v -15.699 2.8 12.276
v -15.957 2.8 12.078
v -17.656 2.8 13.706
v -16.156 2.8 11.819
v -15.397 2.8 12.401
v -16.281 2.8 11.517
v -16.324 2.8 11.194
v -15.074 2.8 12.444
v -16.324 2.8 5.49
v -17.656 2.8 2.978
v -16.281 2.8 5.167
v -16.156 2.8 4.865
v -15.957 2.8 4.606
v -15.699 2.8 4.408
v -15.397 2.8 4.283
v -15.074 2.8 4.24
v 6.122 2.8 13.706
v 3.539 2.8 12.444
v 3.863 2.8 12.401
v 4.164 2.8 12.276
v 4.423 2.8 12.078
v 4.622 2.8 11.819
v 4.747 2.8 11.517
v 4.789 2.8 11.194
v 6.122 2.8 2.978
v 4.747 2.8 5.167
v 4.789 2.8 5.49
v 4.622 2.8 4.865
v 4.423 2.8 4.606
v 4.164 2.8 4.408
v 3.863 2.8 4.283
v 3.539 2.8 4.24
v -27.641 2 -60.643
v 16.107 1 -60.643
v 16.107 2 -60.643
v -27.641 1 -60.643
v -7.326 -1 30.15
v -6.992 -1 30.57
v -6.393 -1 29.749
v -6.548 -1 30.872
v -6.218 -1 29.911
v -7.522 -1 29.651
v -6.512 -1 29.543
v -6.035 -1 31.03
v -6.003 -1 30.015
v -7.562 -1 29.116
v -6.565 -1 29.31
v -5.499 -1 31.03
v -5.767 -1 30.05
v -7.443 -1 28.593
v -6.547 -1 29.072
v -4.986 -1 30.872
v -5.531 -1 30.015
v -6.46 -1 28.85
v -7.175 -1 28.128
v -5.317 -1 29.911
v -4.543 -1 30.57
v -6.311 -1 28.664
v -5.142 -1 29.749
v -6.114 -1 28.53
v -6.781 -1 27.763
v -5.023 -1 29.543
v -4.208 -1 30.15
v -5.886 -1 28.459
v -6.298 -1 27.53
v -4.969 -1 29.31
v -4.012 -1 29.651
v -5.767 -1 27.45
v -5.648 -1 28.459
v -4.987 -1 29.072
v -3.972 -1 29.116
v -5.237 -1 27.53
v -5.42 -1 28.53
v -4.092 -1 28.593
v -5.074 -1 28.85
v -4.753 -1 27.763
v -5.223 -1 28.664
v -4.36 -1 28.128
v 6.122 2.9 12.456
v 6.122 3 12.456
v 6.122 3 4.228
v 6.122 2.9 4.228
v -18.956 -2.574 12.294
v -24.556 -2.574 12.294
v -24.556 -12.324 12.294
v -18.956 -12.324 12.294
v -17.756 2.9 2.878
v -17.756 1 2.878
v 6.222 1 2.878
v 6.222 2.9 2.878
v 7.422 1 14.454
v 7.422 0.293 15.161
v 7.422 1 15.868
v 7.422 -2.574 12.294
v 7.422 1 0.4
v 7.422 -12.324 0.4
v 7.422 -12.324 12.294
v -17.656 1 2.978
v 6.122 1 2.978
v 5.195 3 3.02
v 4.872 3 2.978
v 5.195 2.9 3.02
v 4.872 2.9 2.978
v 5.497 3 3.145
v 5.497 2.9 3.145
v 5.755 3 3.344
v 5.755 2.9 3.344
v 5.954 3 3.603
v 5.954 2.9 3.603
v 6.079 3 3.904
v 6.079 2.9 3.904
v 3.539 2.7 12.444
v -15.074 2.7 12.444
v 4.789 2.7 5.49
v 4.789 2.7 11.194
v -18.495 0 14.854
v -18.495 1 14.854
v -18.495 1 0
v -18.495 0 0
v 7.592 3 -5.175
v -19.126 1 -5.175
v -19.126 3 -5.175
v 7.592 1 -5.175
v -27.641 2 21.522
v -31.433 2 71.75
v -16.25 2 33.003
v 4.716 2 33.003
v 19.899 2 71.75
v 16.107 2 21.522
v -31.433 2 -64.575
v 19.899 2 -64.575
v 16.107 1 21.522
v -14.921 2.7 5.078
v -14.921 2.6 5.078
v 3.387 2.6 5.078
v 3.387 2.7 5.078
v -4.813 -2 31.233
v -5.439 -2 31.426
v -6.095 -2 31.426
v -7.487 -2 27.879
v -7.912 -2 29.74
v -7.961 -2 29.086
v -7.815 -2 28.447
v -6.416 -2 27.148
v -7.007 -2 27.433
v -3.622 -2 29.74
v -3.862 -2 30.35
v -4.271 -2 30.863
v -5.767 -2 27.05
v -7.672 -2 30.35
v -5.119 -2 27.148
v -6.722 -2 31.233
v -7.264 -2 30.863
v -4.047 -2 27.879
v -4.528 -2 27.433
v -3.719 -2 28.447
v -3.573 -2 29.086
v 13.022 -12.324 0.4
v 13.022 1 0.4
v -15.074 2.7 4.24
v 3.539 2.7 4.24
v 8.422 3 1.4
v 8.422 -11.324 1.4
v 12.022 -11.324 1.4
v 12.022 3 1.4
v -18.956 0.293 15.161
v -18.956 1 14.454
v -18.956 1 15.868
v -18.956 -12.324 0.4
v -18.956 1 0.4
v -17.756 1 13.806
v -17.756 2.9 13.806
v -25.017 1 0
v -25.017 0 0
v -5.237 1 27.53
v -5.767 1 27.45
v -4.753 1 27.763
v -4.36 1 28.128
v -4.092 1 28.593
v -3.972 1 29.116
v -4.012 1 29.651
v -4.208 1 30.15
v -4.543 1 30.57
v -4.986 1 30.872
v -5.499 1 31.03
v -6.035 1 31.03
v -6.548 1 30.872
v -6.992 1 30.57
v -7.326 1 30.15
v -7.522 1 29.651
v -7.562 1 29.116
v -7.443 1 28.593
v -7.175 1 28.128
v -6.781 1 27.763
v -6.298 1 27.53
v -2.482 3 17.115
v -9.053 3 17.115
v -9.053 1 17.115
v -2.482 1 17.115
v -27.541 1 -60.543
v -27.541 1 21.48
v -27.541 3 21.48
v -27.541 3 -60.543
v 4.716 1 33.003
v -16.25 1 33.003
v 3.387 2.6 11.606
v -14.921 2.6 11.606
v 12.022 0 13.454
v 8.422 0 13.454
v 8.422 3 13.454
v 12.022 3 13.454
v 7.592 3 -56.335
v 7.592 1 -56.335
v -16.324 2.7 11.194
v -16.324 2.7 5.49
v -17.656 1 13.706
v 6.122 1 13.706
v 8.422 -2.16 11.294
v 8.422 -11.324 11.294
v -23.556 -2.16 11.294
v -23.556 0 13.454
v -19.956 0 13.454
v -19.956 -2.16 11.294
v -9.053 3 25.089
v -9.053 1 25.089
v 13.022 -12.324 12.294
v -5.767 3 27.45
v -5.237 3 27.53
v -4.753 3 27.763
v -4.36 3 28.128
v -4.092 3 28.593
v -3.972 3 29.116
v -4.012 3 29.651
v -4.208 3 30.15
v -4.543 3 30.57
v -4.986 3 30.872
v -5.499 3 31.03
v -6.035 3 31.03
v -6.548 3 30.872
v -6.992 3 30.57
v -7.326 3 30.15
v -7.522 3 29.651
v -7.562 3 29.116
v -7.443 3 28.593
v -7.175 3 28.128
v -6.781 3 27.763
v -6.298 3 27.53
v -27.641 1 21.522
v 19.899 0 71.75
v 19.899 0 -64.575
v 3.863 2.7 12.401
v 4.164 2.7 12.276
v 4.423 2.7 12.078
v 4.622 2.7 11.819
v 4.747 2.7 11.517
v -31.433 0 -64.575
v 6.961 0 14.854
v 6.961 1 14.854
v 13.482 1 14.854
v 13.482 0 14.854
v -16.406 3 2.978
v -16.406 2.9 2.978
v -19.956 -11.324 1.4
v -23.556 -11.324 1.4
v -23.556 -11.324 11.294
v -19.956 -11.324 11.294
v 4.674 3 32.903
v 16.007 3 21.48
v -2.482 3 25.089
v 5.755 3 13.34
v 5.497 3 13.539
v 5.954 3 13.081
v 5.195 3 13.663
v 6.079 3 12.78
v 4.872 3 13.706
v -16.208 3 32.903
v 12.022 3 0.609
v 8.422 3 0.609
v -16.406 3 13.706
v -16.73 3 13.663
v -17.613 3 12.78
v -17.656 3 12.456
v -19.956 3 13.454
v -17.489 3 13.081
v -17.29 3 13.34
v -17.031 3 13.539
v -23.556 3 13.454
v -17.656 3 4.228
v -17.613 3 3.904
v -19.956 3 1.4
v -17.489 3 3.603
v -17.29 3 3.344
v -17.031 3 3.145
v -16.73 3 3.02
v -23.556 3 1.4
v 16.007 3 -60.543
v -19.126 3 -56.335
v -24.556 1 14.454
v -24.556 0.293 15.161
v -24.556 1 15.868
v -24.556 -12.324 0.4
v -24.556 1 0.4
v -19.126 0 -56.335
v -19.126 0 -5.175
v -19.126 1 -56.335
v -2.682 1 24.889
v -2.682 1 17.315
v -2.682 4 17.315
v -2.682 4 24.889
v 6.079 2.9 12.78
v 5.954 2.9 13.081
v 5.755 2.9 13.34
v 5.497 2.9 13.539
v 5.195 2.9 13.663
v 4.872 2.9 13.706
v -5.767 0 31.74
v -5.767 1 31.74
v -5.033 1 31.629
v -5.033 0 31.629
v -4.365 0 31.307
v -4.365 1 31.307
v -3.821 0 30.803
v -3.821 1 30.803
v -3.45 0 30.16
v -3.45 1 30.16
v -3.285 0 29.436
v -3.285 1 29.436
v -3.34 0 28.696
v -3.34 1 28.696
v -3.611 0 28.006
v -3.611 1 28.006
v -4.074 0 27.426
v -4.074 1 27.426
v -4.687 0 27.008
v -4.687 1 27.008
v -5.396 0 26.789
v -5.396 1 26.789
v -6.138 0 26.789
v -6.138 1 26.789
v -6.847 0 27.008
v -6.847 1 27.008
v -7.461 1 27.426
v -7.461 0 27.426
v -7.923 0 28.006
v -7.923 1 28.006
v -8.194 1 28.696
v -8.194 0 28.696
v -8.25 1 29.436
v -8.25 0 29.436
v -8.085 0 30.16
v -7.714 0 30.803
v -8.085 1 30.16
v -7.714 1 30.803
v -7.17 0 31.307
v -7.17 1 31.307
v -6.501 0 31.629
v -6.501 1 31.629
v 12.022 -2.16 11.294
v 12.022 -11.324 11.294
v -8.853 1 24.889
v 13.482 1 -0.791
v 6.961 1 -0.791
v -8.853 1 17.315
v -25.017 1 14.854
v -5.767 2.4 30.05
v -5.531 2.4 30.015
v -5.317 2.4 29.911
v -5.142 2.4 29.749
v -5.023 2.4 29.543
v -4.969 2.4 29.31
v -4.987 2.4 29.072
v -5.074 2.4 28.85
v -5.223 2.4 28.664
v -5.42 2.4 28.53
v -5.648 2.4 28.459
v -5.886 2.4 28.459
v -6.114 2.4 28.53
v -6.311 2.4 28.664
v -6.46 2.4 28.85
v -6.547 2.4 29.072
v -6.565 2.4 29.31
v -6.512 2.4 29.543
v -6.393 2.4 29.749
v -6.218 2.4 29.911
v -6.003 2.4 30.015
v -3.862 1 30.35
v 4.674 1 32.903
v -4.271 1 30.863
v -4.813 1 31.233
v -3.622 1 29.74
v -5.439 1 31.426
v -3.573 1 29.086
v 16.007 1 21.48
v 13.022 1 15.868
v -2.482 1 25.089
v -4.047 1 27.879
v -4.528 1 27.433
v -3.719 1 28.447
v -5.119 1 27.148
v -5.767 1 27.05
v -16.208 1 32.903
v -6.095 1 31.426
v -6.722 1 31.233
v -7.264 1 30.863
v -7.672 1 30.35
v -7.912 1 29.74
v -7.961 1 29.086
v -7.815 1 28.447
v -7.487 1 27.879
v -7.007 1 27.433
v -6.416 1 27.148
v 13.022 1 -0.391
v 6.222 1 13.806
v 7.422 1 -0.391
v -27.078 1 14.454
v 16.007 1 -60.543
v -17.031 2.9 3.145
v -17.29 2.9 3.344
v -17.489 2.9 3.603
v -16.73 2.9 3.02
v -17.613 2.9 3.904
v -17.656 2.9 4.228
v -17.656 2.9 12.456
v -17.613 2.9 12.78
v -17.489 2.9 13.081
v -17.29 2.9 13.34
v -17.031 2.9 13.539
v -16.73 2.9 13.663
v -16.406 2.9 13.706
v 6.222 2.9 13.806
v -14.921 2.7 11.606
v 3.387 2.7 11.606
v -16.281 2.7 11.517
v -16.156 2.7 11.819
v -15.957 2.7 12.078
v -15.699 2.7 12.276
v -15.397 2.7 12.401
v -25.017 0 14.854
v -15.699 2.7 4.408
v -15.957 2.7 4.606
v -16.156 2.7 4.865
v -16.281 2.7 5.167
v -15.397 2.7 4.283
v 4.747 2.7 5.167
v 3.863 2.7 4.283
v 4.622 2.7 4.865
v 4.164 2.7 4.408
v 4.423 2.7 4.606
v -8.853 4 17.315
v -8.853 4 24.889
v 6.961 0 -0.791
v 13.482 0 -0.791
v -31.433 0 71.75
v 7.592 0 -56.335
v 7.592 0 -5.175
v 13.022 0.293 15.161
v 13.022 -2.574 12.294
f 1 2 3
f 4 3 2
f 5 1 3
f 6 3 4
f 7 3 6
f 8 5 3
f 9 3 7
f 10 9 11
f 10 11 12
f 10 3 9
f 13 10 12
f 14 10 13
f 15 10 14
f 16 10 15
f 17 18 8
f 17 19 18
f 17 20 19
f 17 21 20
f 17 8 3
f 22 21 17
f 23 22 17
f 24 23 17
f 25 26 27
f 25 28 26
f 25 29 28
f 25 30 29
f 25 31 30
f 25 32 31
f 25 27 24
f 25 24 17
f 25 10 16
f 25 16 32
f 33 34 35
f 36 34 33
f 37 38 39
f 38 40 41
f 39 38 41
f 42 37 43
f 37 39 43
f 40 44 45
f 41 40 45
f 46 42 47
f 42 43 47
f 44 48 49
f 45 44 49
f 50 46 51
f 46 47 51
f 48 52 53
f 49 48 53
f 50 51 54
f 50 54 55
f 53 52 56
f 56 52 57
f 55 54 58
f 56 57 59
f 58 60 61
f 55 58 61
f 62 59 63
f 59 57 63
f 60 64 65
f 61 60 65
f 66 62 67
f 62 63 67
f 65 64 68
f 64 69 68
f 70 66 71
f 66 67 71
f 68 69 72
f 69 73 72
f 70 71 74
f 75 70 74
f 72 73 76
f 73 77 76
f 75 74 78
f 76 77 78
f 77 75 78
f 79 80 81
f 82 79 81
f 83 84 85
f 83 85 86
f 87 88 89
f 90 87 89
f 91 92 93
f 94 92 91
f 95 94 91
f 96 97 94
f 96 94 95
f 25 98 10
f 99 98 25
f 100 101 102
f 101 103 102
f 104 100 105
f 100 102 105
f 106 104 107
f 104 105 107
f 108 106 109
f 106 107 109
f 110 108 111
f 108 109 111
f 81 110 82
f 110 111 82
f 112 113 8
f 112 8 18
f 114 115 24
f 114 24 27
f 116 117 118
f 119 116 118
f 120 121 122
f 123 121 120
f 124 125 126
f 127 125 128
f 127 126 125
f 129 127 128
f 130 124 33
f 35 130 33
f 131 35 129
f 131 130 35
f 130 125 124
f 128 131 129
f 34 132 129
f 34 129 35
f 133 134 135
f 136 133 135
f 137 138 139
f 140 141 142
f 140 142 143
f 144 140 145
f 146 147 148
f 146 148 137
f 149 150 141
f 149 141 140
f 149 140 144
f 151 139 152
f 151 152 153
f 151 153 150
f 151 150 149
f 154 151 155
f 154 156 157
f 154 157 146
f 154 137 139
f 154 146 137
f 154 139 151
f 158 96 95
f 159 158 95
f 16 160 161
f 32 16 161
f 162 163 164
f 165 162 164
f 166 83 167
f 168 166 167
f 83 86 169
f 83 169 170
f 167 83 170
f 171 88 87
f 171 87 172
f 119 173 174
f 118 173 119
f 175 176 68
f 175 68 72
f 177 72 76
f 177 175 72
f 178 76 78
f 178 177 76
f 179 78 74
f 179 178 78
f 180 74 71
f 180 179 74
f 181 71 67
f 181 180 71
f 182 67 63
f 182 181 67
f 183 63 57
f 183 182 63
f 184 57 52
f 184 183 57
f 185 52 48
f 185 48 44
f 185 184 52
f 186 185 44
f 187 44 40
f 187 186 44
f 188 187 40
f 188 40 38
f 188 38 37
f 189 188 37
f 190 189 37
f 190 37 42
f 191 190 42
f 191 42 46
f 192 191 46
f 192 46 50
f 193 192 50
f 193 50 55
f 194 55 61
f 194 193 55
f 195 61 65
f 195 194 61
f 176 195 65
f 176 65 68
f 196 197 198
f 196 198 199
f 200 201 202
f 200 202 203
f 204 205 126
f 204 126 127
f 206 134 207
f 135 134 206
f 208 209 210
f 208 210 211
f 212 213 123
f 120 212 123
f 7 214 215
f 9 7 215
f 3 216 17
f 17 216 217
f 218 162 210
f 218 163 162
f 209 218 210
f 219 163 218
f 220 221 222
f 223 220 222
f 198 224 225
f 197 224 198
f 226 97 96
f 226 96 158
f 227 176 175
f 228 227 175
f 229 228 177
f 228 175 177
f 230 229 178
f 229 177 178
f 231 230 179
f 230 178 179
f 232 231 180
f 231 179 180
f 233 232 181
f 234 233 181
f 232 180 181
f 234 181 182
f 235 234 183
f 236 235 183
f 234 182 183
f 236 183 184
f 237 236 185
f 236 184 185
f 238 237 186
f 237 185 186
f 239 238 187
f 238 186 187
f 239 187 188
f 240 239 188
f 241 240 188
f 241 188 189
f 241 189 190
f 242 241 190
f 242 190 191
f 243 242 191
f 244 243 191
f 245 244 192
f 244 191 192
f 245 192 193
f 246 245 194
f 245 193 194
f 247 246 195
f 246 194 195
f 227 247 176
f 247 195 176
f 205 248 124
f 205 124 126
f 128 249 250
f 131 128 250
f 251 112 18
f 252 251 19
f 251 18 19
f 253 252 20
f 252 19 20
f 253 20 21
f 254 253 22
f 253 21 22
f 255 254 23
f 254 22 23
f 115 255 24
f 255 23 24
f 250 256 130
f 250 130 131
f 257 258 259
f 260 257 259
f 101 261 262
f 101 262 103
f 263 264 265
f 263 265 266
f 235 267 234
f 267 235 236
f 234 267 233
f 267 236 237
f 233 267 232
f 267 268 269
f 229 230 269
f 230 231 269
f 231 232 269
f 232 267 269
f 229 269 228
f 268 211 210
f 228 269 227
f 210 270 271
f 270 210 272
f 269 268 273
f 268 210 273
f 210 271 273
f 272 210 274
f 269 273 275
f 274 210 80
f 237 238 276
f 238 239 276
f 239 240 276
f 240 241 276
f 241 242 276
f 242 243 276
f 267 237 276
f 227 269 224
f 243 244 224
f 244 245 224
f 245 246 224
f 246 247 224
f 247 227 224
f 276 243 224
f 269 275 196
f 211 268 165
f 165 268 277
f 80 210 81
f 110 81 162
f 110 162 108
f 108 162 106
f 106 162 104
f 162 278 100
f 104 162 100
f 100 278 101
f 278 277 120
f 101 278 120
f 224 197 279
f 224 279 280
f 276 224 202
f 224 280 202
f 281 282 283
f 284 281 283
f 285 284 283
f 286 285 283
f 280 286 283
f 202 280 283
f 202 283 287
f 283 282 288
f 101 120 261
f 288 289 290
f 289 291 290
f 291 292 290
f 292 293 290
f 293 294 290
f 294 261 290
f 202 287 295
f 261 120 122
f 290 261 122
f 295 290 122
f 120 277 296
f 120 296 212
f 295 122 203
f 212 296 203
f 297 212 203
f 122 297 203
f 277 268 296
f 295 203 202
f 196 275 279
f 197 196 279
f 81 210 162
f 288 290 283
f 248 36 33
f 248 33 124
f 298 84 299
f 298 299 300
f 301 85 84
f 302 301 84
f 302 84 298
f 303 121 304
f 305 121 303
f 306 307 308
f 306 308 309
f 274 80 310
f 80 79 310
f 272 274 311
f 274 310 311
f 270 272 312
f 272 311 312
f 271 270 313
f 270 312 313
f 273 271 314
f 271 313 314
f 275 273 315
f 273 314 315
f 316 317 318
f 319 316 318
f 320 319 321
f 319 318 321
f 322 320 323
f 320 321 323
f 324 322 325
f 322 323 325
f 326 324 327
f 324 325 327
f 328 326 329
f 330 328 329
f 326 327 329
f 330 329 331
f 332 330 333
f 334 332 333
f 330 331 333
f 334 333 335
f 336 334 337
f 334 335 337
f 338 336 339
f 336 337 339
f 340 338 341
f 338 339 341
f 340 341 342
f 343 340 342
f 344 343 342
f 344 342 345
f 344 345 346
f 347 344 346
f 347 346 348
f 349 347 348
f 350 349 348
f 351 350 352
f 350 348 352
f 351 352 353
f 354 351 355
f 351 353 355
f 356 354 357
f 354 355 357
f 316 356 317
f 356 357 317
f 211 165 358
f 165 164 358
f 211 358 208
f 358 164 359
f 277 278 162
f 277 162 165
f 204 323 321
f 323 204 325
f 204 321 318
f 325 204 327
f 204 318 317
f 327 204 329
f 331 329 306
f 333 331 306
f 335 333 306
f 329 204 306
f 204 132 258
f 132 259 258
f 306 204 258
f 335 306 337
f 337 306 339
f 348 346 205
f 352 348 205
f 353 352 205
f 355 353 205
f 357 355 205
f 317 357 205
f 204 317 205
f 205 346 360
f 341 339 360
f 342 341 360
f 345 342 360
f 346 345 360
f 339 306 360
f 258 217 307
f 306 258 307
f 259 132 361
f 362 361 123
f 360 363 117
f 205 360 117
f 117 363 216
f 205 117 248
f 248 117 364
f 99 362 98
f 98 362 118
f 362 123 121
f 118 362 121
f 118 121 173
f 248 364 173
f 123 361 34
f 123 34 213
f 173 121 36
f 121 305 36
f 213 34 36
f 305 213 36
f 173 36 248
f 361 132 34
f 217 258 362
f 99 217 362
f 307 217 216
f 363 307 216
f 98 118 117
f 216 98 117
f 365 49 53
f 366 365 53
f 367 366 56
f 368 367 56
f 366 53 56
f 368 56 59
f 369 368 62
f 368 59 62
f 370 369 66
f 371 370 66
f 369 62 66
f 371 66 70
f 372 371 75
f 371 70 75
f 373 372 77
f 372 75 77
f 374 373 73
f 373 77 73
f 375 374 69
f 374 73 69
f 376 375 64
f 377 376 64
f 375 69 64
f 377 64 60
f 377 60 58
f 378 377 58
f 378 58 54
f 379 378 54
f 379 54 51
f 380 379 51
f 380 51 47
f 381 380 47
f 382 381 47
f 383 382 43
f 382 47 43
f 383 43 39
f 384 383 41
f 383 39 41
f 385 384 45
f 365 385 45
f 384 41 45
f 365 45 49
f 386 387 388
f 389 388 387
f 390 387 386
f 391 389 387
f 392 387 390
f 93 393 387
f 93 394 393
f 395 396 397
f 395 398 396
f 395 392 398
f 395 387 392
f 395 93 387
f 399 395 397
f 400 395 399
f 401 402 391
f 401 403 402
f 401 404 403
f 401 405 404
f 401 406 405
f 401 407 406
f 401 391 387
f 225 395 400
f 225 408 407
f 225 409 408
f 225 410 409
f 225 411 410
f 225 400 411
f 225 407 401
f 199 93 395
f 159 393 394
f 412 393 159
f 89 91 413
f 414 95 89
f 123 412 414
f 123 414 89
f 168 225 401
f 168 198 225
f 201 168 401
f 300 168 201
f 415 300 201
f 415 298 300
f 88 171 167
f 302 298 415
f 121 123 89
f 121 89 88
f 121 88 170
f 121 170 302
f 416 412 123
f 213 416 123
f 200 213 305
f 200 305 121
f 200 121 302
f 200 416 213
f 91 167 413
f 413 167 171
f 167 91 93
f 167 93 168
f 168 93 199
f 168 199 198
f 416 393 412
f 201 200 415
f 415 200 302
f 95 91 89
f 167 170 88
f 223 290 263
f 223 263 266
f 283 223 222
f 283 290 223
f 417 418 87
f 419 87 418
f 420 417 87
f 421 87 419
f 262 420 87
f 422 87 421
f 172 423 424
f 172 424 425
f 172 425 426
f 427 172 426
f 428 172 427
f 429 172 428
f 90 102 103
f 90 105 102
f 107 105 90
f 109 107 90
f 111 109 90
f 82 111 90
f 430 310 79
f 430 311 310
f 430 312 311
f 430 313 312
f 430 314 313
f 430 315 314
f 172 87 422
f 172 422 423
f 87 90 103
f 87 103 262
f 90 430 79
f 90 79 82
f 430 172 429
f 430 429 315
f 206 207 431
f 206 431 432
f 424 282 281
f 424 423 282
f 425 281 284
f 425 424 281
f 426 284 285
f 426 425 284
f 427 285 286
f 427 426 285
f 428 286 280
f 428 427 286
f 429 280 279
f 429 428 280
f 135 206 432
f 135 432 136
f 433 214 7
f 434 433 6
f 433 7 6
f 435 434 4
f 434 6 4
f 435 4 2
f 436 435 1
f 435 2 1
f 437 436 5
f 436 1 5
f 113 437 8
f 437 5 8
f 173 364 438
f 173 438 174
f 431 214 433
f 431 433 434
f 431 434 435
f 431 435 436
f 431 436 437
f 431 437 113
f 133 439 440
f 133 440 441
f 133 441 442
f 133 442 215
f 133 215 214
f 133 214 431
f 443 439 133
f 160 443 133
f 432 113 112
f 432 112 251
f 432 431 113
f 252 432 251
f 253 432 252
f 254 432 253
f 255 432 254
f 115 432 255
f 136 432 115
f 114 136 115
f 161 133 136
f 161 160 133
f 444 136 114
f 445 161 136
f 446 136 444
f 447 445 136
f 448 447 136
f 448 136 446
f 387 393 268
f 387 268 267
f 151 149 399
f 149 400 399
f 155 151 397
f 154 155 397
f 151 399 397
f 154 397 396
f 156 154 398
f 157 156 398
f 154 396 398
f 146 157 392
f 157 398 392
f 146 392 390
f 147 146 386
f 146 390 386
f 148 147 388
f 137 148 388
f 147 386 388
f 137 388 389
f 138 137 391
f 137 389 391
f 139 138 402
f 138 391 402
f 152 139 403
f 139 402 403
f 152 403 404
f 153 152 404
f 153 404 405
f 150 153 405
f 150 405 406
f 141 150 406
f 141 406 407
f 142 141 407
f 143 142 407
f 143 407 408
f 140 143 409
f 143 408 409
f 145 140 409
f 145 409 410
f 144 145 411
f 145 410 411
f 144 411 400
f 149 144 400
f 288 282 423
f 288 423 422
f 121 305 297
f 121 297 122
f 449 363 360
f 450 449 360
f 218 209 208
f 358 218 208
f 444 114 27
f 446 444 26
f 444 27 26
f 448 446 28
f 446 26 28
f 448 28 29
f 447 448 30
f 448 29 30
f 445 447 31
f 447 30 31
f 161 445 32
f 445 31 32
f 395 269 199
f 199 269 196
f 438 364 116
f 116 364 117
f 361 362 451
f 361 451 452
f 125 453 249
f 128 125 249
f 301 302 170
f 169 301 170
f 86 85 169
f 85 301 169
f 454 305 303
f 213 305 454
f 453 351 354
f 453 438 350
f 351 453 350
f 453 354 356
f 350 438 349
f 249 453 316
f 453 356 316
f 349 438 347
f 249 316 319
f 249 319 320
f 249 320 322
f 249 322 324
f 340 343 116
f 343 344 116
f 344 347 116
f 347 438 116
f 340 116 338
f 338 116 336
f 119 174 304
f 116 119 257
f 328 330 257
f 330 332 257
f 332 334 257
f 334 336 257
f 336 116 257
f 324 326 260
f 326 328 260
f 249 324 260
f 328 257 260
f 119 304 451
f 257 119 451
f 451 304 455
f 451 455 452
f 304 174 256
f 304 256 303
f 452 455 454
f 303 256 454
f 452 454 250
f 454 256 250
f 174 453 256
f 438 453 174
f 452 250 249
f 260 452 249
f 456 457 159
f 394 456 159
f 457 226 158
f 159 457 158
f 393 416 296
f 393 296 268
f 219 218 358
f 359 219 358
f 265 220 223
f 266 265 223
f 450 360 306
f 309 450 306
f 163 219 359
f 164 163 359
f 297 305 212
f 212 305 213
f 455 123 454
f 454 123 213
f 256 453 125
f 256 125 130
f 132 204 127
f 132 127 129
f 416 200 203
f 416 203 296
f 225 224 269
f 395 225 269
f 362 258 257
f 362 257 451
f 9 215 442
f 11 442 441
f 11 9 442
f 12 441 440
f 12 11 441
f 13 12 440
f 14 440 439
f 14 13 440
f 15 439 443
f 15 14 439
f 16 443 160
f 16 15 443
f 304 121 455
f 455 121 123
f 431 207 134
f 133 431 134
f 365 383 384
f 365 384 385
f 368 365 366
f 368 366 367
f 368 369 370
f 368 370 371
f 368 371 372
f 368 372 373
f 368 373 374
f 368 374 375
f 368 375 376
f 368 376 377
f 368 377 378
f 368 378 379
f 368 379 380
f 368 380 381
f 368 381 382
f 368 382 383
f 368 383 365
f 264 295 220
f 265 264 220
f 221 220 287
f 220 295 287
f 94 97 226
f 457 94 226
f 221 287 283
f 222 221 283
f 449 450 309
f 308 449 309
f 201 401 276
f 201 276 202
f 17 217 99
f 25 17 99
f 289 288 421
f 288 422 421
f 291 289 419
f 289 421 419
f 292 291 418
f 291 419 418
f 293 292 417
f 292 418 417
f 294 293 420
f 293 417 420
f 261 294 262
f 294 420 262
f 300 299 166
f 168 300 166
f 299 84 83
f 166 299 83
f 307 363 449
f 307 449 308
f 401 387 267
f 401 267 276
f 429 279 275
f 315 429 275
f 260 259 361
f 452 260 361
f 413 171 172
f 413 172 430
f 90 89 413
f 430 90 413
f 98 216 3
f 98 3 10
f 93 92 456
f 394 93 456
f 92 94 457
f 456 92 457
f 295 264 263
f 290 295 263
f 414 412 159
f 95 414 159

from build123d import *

# Parameters (mm, degrees)
SKETCH1_W                   = 51.332398317
SKETCH1_H                   = 136.325385694
BOSS_EXTRUDE1_DEPTH         = 2
CUT_EXTRUDE1_DEPTH          = 1
SKETCH3_W                   = 26.718092566
SKETCH3_H                   = 51.160838605
CUT_EXTRUDE2_DEPTH          = 1
SKETCH4_W                   = 20.659186536
SKETCH4_H                   = 13.604488078
BOSS_EXTRUDE2_DEPTH         = 1
SKETCH5_W                   = 6.521739131
SKETCH5_H                   = 14.853538096
SKETCH5_W_2                 = 6.52173913
SKETCH5_H_2                 = 15.644764374
CUT_EXTRUDE3_DEPTH          = 1
SKETCH6_W                   = 6.171107994
SKETCH6_H                   = 7.573632539
CUT_EXTRUDE4_DEPTH          = 1
SKETCH7_R                   = 2.489481066
CUT_EXTRUDE5_DEPTH          = 1
BOSS_EXTRUDE3_DEPTH         = 1
SKETCH10_W                  = 6.171107994
SKETCH10_H                  = 7.573632539
BOSS_EXTRUDE4_DEPTH         = 4
BOSS_EXTRUDE5_DEPTH         = 2
SKETCH12_W                  = 6.571107994
SKETCH12_H                  = 7.973632539
CUT_EXTRUDE6_DEPTH          = 2
SKETCH13_R                  = 1.8
SKETCH13_W                  = 26.718092566
SKETCH13_H                  = 51.160838605
CUT_EXTRUDE9_DEPTH          = 2
SKETCH14_R                  = 2.2
SKETCH14_R_2                = 1.8
BOSS_EXTRUDE11_DEPTH        = 2
SKETCH17_R                  = 2.2
BOSS_EXTRUDE12_DEPTH        = 1
SKETCH18_R                  = 0.8
BOSS_EXTRUDE15_DEPTH        = 3.4
EXTRUDE_THIN3_OUTLINE_W     = 5.6
EXTRUDE_THIN3_OUTLINE_H     = 14.844764374
EXTRUDE_THIN3_OUTLINE_W_2   = 3.6
EXTRUDE_THIN3_OUTLINE_H_2   = 12.844764374
EXTRUDE_THIN3_DEPTH         = 13.32398317
EXTRUDE_THIN3_2_OUTLINE_W   = 5.6
EXTRUDE_THIN3_2_OUTLINE_H   = 14.053538096
EXTRUDE_THIN3_2_OUTLINE_W_2 = 3.6
EXTRUDE_THIN3_2_OUTLINE_H_2 = 12.053538096
EXTRUDE_THIN3_2_DEPTH       = 13.32398317
SKETCH26_W                  = 3.6
SKETCH26_H                  = 12.053538096
SKETCH26_H_2                = 12.844764374
CUT_EXTRUDE12_DEPTH         = 13.32398317
SKETCH27_W                  = 5.6
SKETCH27_H                  = 14.053538096
BOSS_EXTRUDE18_DEPTH        = 1
SKETCH27_W_2                = 5.570395019
SKETCH27_H_2                = 14.844764374
BOSS_EXTRUDE18_2_DEPTH      = 1
SKETCH28_W                  = 20.659186536
SKETCH28_H                  = 13.604488078
CUT_EXTRUDE13_DEPTH         = 1
SKETCH29_W                  = 23.777559608
SKETCH29_H                  = 10.728152402
CUT_EXTRUDE15_DEPTH         = 10
SKETCH30_W                  = 23.777559608
SKETCH30_H                  = 10.728152402
SKETCH30_W_2                = 21.112762974
SKETCH30_H_2                = 8.203608222
BOSS_EXTRUDE20_DEPTH        = 1.8
SKETCH31_W                  = 21.112762974
SKETCH31_H                  = 8.203608222
BOSS_EXTRUDE21_DEPTH        = 1.6
SKETCH35_W                  = 23.977559608
SKETCH35_H                  = 10.928152402
CUT_EXTRUDE21_DEPTH         = 1.9
FILLET2_R                   = 1.25
FILLET3_R                   = 1.25
SKETCH37_W                  = 18.307713885
SKETCH37_H                  = 6.527591392
CUT_EXTRUDE22_DEPTH         = 0.1
SKETCH41_W                  = 18.307713885
SKETCH41_H                  = 6.527591392
BOSS_EXTRUDE27_DEPTH        = 0.1
SKETCH43_W                  = 18.307713885
SKETCH43_H                  = 6.527591392
BOSS_EXTRUDE28_DEPTH        = 0.1
CUT_EXTRUDE24_DEPTH         = 40.1
SKETCH51_W                  = 5.6
SKETCH51_H                  = 4.468914857
BOSS_EXTRUDE29_DEPTH        = 1
BOSS_EXTRUDE29_2_DEPTH      = 1
SKETCH52_W                  = 5.6
SKETCH52_H                  = 1
BOSS_EXTRUDE30_DEPTH        = 2.5
BOSS_EXTRUDE30_2_DEPTH      = 2.5
SKETCH53_W                  = 5.6
SKETCH53_H                  = 1
BOSS_EXTRUDE31_DEPTH        = 1
BOSS_EXTRUDE32_REACH        = 81.818
SKETCH54_W                  = 5.6
SKETCH54_H                  = 1
SKETCH55_W                  = 3.6
SKETCH55_H                  = 0.791226278
BOSS_EXTRUDE33_DEPTH        = 14.323983
SKETCH56_W                  = 0.791226278
SKETCH56_H                  = 13.32398317
CUT_EXTRUDE25_DEPTH         = 5.6
CUT_EXTRUDE_THIN1_DEPTH     = 1


with BuildPart() as part:
    # Sketch1 → Boss-Extrude1 (new body)
    with BuildSketch(Plane(origin=(0, 0, 0), x_dir=(1, 0, 0), z_dir=(0, 1, 0))):
        with Locations((-5.767223106, -3.58751015)):
            Rectangle(SKETCH1_W, SKETCH1_H)
    extrude(amount=BOSS_EXTRUDE1_DEPTH)

    # Sketch2 → Cut-Extrude1 (cut)
    with BuildSketch(Plane(origin=(0, 2, 0), x_dir=(1, 0, 0), z_dir=(0, 1, 0))):
        Polygon((-27.541416655, -30.445855171), (-27.541416655, 60.542924633), (16.006970442, 60.542924633), (16.006970442, -30.445855171), (4.678976052, -41.666051524), (-16.213422265, -41.666051524), align=None)
    extrude(amount=-CUT_EXTRUDE1_DEPTH, mode=Mode.SUBTRACT)

    # Sketch3 → Cut-Extrude2 (cut)
    with BuildSketch(Plane(origin=(0, 1, 0), x_dir=(1, 0, 0), z_dir=(0, 1, 0))):
        with Locations((-5.767223107, 30.754931698)):
            Rectangle(SKETCH3_W, SKETCH3_H)
    extrude(amount=-CUT_EXTRUDE2_DEPTH, mode=Mode.SUBTRACT)

    # Sketch4 → Boss-Extrude2 (add)
    with BuildSketch(Plane(origin=(0, 1, 0), x_dir=(1, 0, 0), z_dir=(0, 1, 0))):
        with Locations((-5.767223107, -7.988180452)):
            Rectangle(SKETCH4_W, SKETCH4_H)
    extrude(amount=BOSS_EXTRUDE2_DEPTH)

    # Sketch5 → Cut-Extrude3 (cut)
    with BuildSketch(Plane(origin=(0, 1, 0), x_dir=(1, 0, 0), z_dir=(0, 1, 0))):
        with Locations((-21.756002911, -7.426769048)):
            Rectangle(SKETCH5_W, SKETCH5_H)
        with Locations((10.221556697, -7.031155909)):
            Rectangle(SKETCH5_W_2, SKETCH5_H_2)
    extrude(amount=-CUT_EXTRUDE3_DEPTH, mode=Mode.SUBTRACT)

    # Sketch6 → Cut-Extrude4 (cut)
    with BuildSketch(Plane(origin=(0, 1, 0), x_dir=(1, 0, 0), z_dir=(0, 1, 0))):
        with Locations((-5.767223107, -21.101784941)):
            Rectangle(SKETCH6_W, SKETCH6_H)
    extrude(amount=-CUT_EXTRUDE4_DEPTH, mode=Mode.SUBTRACT)

    # Sketch7 → Cut-Extrude5 (cut)
    with BuildSketch(Plane(origin=(0, 1, 0), x_dir=(1, 0, 0), z_dir=(0, 1, 0))):
        with Locations(Location((-5.767223107, -29.250452542, 0), (0, 0, 270))):
            Circle(SKETCH7_R)
    extrude(amount=-CUT_EXTRUDE5_DEPTH, mode=Mode.SUBTRACT)

    # Sketch8 → Boss-Extrude3 (add)
    with BuildSketch(Plane(origin=(0, 1, 0), x_dir=(1, 0, 0), z_dir=(0, 1, 0))):
        Polygon((-27.541416655, -21.480466567), (-27.541416655, -30.445855171), (-16.213422265, -41.666051524), (4.678976052, -41.666051524), (16.006970442, -30.445855171), (16.006970442, -21.480466567), (4.673870862, -32.903327717), (-16.208317076, -32.903327717), align=None)
    extrude(amount=BOSS_EXTRUDE3_DEPTH)

    # Sketch10 → Boss-Extrude4 (add)
    with BuildSketch(Plane.XZ):
        with Locations((-5.767223107, 21.101784941)):
            Rectangle(SKETCH10_W, SKETCH10_H)
    extrude(amount=-BOSS_EXTRUDE4_DEPTH)

    # Sketch28 → Cut-Extrude13 (cut)
    with BuildSketch(Plane(origin=(0, 2, 0), x_dir=(1, 0, 0), z_dir=(0, 1, 0))):
        with Locations((-5.767223107, -7.988180452)):
            Rectangle(SKETCH28_W, SKETCH28_H)
    extrude(amount=-CUT_EXTRUDE13_DEPTH, mode=Mode.SUBTRACT)


with BuildPart() as body_2:
    # Sketch11 → Boss-Extrude5 (new body)
    with BuildSketch(Plane(origin=(0, 1, 0), x_dir=(1, 0, 0), z_dir=(0, 1, 0))):
        Polygon((-27.541416655, 60.542924633), (16.006970442, 60.542924633), (16.006970442, -21.480466567), (4.673870862, -32.903327717), (-16.208317076, -32.903327717), (-27.541416655, -21.480466567), align=None)
    extrude(amount=BOSS_EXTRUDE5_DEPTH)

    # Sketch12 → Cut-Extrude6 (cut)
    with BuildSketch(Plane(origin=(0, 3, 0), x_dir=(1, 0, 0), z_dir=(0, 1, 0))):
        with Locations((-5.767223107, -21.10178494)):
            Rectangle(SKETCH12_W, SKETCH12_H)
    extrude(amount=-CUT_EXTRUDE6_DEPTH, mode=Mode.SUBTRACT)

    # Sketch13 → Cut-Extrude9 (cut)
    with BuildSketch(Plane.XZ.offset(-1)):
        with Locations(Location((-5.767223107, 29.250452542, 0), (0, 0, 270))):
            Circle(SKETCH13_R)
        with Locations((-5.767223107, -30.754931698)):
            Rectangle(SKETCH13_W, SKETCH13_H)
    extrude(amount=-CUT_EXTRUDE9_DEPTH, mode=Mode.SUBTRACT)


with BuildPart() as body_3:
    # Sketch14 → Boss-Extrude11 (new body)
    with BuildSketch(Plane.XZ.offset(-1)):
        with Locations(Location((-5.767223107, 29.250452542, 0), (0, 0, 270))):
            Circle(SKETCH14_R)
        with Locations(Location((-5.767223107, 29.250452542, 0), (0, 0, 270))):
            Circle(SKETCH14_R_2, mode=Mode.SUBTRACT)
    extrude(amount=BOSS_EXTRUDE11_DEPTH)

    # Combine1: union body 2
    add(body_2.part)

    # Sketch17 → Boss-Extrude12 (add)
    with BuildSketch(Plane.XZ.offset(1)):
        with Locations(Location((-5.767223107, 29.250452542, 0), (0, 0, 270))):
            Circle(SKETCH17_R)
    extrude(amount=BOSS_EXTRUDE12_DEPTH)


with BuildPart() as body_3_2:
    # Sketch18 → Boss-Extrude15 (new body)
    with BuildSketch(Plane(origin=(0, -1, 0), x_dir=(1, 0, 0), z_dir=(0, 1, 0))):
        with Locations(Location((-5.767223107, -29.250452542, 0), (0, 0, 270))):
            Circle(SKETCH18_R)
    extrude(amount=BOSS_EXTRUDE15_DEPTH)


with BuildPart() as body_3_1:
    add(body_3.part)

    # Combine3: union body 3 2
    add(body_3_2.part)

    # Sketch26 → Cut-Extrude12 (cut)
    with BuildSketch(Plane.XZ.offset(-1)):
        with Locations((-21.756002911, 7.426769048)):
            Rectangle(SKETCH26_W, SKETCH26_H)
        with Locations((10.221556697, 7.031155909)):
            Rectangle(SKETCH26_W, SKETCH26_H_2)
    extrude(amount=-CUT_EXTRUDE12_DEPTH, mode=Mode.SUBTRACT)


with BuildPart() as body_3_3:
    # Extrude-Thin3: read off the stored shape, not the designer's step
    # Extrude-Thin3 outline → Extrude-Thin3 (new body)
    with BuildSketch(Plane.XZ.offset(-1)):
        with Locations((10.221556697, 7.031155909)):
            Rectangle(EXTRUDE_THIN3_OUTLINE_W, EXTRUDE_THIN3_OUTLINE_H)
        with Locations((10.221556697, 7.031155909)):
            Rectangle(EXTRUDE_THIN3_OUTLINE_W_2, EXTRUDE_THIN3_OUTLINE_H_2, mode=Mode.SUBTRACT)
    extrude(amount=EXTRUDE_THIN3_DEPTH)


with BuildPart() as body_4:
    # Extrude-Thin3 2 outline → Extrude-Thin3 2 (new body)
    with BuildSketch(Plane.XZ.offset(-1)):
        with Locations((-21.756002911, 7.426769048)):
            Rectangle(EXTRUDE_THIN3_2_OUTLINE_W, EXTRUDE_THIN3_2_OUTLINE_H)
        with Locations((-21.756002911, 7.426769048)):
            Rectangle(EXTRUDE_THIN3_2_OUTLINE_W_2, EXTRUDE_THIN3_2_OUTLINE_H_2, mode=Mode.SUBTRACT)
    extrude(amount=EXTRUDE_THIN3_2_DEPTH)


with BuildPart() as body_5:
    # Sketch27 → Boss-Extrude18 (new body)
    with BuildSketch(Plane.XZ.offset(12.32398317)):
        with Locations((-21.756002911, 7.426769048)):
            Rectangle(SKETCH27_W, SKETCH27_H)
    extrude(amount=-BOSS_EXTRUDE18_DEPTH)


with BuildPart() as body_6:
    # Sketch27 → Boss-Extrude18 2 (new body)
    with BuildSketch(Plane.XZ.offset(12.32398317)):
        with Locations((10.206754207, 7.031155909)):
            Rectangle(SKETCH27_W_2, SKETCH27_H_2)
    extrude(amount=-BOSS_EXTRUDE18_2_DEPTH)


with BuildPart() as body_4_1:
    add(body_4.part)

    # Combine4: union body 3 3, body 3, body 5, body 6
    add(body_3_3.part)
    add(body_3_1.part)
    add(body_5.part)
    add(body_6.part)

    # Sketch29 → Cut-Extrude15 (cut)
    with BuildSketch(Plane(origin=(0, 3, 0), x_dir=(1, 0, 0), z_dir=(0, 1, 0))):
        with Locations((-5.767223107, -8.341916313)):
            Rectangle(SKETCH29_W, SKETCH29_H)
    extrude(amount=-CUT_EXTRUDE15_DEPTH, mode=Mode.SUBTRACT)

    # Sketch35 → Cut-Extrude21 (cut)
    with BuildSketch(Plane.XZ.offset(-1)):
        with Locations((-5.767223107, 8.341916313)):
            Rectangle(SKETCH35_W, SKETCH35_H)
    extrude(amount=-CUT_EXTRUDE21_DEPTH, mode=Mode.SUBTRACT)

    # Fillet2
    fillet2_edges = [body_4_1.edges().sort_by_distance(p)[0] for p in [
        (-17.656002911, 2.95, 13.705992514),
        (6.121556697, 2.95, 13.705992514),
        (6.121556697, 2.95, 2.977840112),
        (-17.656002911, 2.95, 2.977840112),
    ]]
    fillet(fillet2_edges, radius=FILLET2_R)

    # Sketch50 → Cut-Extrude24 (cut)
    with BuildSketch(Plane(origin=(13.021556697, 0, 0), x_dir=(0, 0, -1), z_dir=(1, 0, 0))):
        Polygon((-14.453538096, 1), (-11.293538096, -2.16), (-11.293538096, -12.32398317), (-14.453538096, -12.32398317), align=None)
    extrude(amount=-CUT_EXTRUDE24_DEPTH, mode=Mode.SUBTRACT)


with BuildPart() as body_3_4:
    # Sketch30 → Boss-Extrude20 (new body)
    with BuildSketch(Plane(origin=(0, 1, 0), x_dir=(1, 0, 0), z_dir=(0, 1, 0))):
        with Locations((-5.767223107, -8.341916313)):
            Rectangle(SKETCH30_W, SKETCH30_H)
        with Locations((-5.767223107, -8.341916313)):
            Rectangle(SKETCH30_W_2, SKETCH30_H_2, mode=Mode.SUBTRACT)
    extrude(amount=BOSS_EXTRUDE20_DEPTH)


with BuildPart() as body_4_2:
    # Sketch31 → Boss-Extrude21 (new body)
    with BuildSketch(Plane(origin=(0, 1, 0), x_dir=(1, 0, 0), z_dir=(0, 1, 0))):
        with Locations((-5.767223107, -8.341916313)):
            Rectangle(SKETCH31_W, SKETCH31_H)
    extrude(amount=BOSS_EXTRUDE21_DEPTH)


with BuildPart() as part_1:
    add(part.part)

    # Combine5: union body 3 4, body 4 2
    add(body_3_4.part)
    add(body_4_2.part)

    # Fillet3
    fillet3_edges = [part_1.edges().sort_by_distance(p)[0] for p in [
        (-16.323604594, 2.7, 12.443720424),
        (4.78915838, 2.7, 12.443720424),
        (4.78915838, 2.7, 4.240112202),
        (-16.323604594, 2.7, 4.240112202),
    ]]
    fillet(fillet3_edges, radius=FILLET3_R)

    # Sketch37 → Cut-Extrude22 (cut)
    with BuildSketch(Plane(origin=(0, 2.6, 0), x_dir=(1, 0, 0), z_dir=(0, 1, 0))):
        with Locations((-5.767223107, -8.341916313)):
            Rectangle(SKETCH37_W, SKETCH37_H)
    extrude(amount=-CUT_EXTRUDE22_DEPTH, mode=Mode.SUBTRACT)


with BuildPart() as body_3_5:
    # Sketch41 → Boss-Extrude27 (new body)
    with BuildSketch(Plane(origin=(0, 2.6, 0), x_dir=(1, 0, 0), z_dir=(0, 1, 0))):
        with BuildLine():
            Line((-15.073604594, -12.443720424), (3.53915838, -12.443720424))
            ThreePointArc((3.53915838, -12.443720424), (4.423041856, -12.077603901), (4.78915838, -11.193720424))
            Line((4.78915838, -11.193720424), (4.78915838, -5.490112202))
            ThreePointArc((4.78915838, -5.490112202), (4.423041856, -4.606228725), (3.53915838, -4.240112202))
            Line((3.53915838, -4.240112202), (-15.073604594, -4.240112202))
            ThreePointArc((-15.073604594, -4.240112202), (-15.95748807, -4.606228725), (-16.323604594, -5.490112202))
            Line((-16.323604594, -5.490112202), (-16.323604594, -11.193720424))
            ThreePointArc((-16.323604594, -11.193720424), (-15.95748807, -12.077603901), (-15.073604594, -12.443720424))
        make_face()
        with Locations((-5.767223107, -8.341916313)):
            Rectangle(SKETCH41_W, SKETCH41_H, mode=Mode.SUBTRACT)
    extrude(amount=BOSS_EXTRUDE27_DEPTH)

    # Combine6: union part
    add(part_1.part)


with BuildPart() as body_3_6:
    # Sketch43 → Boss-Extrude28 (new body)
    with BuildSketch(Plane(origin=(0, 2.5, 0), x_dir=(1, 0, 0), z_dir=(0, 1, 0))):
        with Locations((-5.767223107, -8.341916313)):
            Rectangle(SKETCH43_W, SKETCH43_H)
    extrude(amount=BOSS_EXTRUDE28_DEPTH)

    # Combine7: union body 3 5
    add(body_3_5.part)

    # Sketch58 → Cut-Extrude-Thin1 (cut)
    with BuildSketch(Plane(origin=(0, 1, 0), x_dir=(1, 0, 0), z_dir=(0, 1, 0))):
        Polygon((-16.249969686, -33.003327717), (4.715523472, -33.003327717), (16.106970442, -21.521657048), (16.106970442, 60.642924633), (-27.641416655, 60.642924633), (-27.641416655, -21.521657048), align=None)
        Polygon((-16.208317076, -32.903327717), (4.673870862, -32.903327717), (16.006970442, -21.480466567), (16.006970442, 60.542924633), (-27.541416655, 60.542924633), (-27.541416655, -21.480466567), align=None, mode=Mode.SUBTRACT)
    extrude(amount=CUT_EXTRUDE_THIN1_DEPTH, mode=Mode.SUBTRACT)


with BuildPart() as body_3_7:
    # Sketch51 → Boss-Extrude29 (new body)
    with BuildSketch(Plane(origin=(0, -6.726769048, 6.726769048), x_dir=(1, 0, 0), z_dir=(0, -0.7071067811865475, 0.7071067811865476))):
        with Locations((10.221556697, 8.692844153)):
            Rectangle(SKETCH51_W, SKETCH51_H)
    extrude(amount=BOSS_EXTRUDE29_DEPTH)


with BuildPart() as body_4_3:
    # Sketch51 → Boss-Extrude29 2 (new body)
    with BuildSketch(Plane(origin=(0, -6.726769048, 6.726769048), x_dir=(1, 0, 0), z_dir=(0, -0.7071067811865475, 0.7071067811865476))):
        with Locations((-21.756002911, 8.692844153)):
            Rectangle(SKETCH51_W, SKETCH51_H)
    extrude(amount=BOSS_EXTRUDE29_2_DEPTH)


with BuildPart() as body_5_2:
    # Sketch52 → Boss-Extrude30 (new body)
    with BuildSketch(Plane(origin=(0, 7.726769048, 7.726769048), x_dir=(1, 0, 0), z_dir=(0, 0.7071067811865476, 0.7071067811865475))):
        with Locations((10.221556697, -10.013088019)):
            Rectangle(SKETCH52_W, SKETCH52_H)
    extrude(amount=BOSS_EXTRUDE30_DEPTH)


with BuildPart() as body_6_2:
    # Sketch52 → Boss-Extrude30 2 (new body)
    with BuildSketch(Plane(origin=(0, 7.726769048, 7.726769048), x_dir=(1, 0, 0), z_dir=(0, 0.7071067811865476, 0.7071067811865475))):
        with Locations((-21.756002911, -10.013088019)):
            Rectangle(SKETCH52_W, SKETCH52_H)
    extrude(amount=BOSS_EXTRUDE30_2_DEPTH)


with BuildPart() as body_4_4:
    add(body_4_1.part)

    # Combine8: union body 3 7, body 4 3, body 5 2, body 6 2
    add(body_3_7.part)
    add(body_4_3.part)
    add(body_5_2.part)
    add(body_6_2.part)

    # Sketch53 → Boss-Extrude31 (add)
    with BuildSketch(Plane.XY.offset(11.293538096)):
        with Locations((-21.756002911, -11.82398317)):
            Rectangle(SKETCH53_W, SKETCH53_H)
        with Locations((10.221556697, -11.82398317)):
            Rectangle(SKETCH53_W, SKETCH53_H)
    extrude(amount=BOSS_EXTRUDE31_DEPTH)


with BuildPart() as body_3_8:

    # Sketch54 → Boss-Extrude32 (new, up to next)
    with BuildSketch(Plane(origin=(0, -11.32398317, 0), x_dir=(1, 0, 0), z_dir=(0, 1, 0)), mode=Mode.PRIVATE) as boss_extrude32_sk1:
        with Locations((-21.756002911, -11.793538096)):
            Rectangle(SKETCH54_W, SKETCH54_H)
    boss_extrude32_tool1 = extrude(boss_extrude32_sk1.sketch, amount=BOSS_EXTRUDE32_REACH, mode=Mode.PRIVATE) - body_4_4.part
    # Sketch54 → Boss-Extrude32 (new, up to next)
    with BuildSketch(Plane(origin=(0, -11.32398317, 0), x_dir=(1, 0, 0), z_dir=(0, 1, 0)), mode=Mode.PRIVATE) as boss_extrude32_sk2:
        with Locations((10.221556697, -11.793538096)):
            Rectangle(SKETCH54_W, SKETCH54_H)
    boss_extrude32_tool2 = extrude(boss_extrude32_sk2.sketch, amount=BOSS_EXTRUDE32_REACH, mode=Mode.PRIVATE) - body_4_4.part
    add(boss_extrude32_tool1.solids().sort_by_distance((-21.756003, -11.323983, 11.793538))[0])
    add(boss_extrude32_tool2.solids().sort_by_distance((10.221557, -11.323983, 11.793538))[0])


with BuildPart() as body_4_5:
    add(body_4_4.part)

    # Combine9: union body 3 8
    add(body_3_8.part)

    # Sketch55 → Boss-Extrude33 (add)
    with BuildSketch(Plane(origin=(0, -11.32398317, 0), x_dir=(1, 0, 0), z_dir=(0, 1, 0))):
        with Locations((10.221556697, -1.004386861)):
            Rectangle(SKETCH55_W, SKETCH55_H)
    extrude(amount=BOSS_EXTRUDE33_DEPTH)

    # Sketch56 → Cut-Extrude25 (cut)
    with BuildSketch(Plane.ZY.offset(-7.421556697)):
        with Locations((0.004386861, -5.661991585)):
            Rectangle(SKETCH56_W, SKETCH56_H)
    extrude(amount=-CUT_EXTRUDE25_DEPTH, mode=Mode.SUBTRACT)


solid = Compound([body_3_6.part, body_4_5.part])
